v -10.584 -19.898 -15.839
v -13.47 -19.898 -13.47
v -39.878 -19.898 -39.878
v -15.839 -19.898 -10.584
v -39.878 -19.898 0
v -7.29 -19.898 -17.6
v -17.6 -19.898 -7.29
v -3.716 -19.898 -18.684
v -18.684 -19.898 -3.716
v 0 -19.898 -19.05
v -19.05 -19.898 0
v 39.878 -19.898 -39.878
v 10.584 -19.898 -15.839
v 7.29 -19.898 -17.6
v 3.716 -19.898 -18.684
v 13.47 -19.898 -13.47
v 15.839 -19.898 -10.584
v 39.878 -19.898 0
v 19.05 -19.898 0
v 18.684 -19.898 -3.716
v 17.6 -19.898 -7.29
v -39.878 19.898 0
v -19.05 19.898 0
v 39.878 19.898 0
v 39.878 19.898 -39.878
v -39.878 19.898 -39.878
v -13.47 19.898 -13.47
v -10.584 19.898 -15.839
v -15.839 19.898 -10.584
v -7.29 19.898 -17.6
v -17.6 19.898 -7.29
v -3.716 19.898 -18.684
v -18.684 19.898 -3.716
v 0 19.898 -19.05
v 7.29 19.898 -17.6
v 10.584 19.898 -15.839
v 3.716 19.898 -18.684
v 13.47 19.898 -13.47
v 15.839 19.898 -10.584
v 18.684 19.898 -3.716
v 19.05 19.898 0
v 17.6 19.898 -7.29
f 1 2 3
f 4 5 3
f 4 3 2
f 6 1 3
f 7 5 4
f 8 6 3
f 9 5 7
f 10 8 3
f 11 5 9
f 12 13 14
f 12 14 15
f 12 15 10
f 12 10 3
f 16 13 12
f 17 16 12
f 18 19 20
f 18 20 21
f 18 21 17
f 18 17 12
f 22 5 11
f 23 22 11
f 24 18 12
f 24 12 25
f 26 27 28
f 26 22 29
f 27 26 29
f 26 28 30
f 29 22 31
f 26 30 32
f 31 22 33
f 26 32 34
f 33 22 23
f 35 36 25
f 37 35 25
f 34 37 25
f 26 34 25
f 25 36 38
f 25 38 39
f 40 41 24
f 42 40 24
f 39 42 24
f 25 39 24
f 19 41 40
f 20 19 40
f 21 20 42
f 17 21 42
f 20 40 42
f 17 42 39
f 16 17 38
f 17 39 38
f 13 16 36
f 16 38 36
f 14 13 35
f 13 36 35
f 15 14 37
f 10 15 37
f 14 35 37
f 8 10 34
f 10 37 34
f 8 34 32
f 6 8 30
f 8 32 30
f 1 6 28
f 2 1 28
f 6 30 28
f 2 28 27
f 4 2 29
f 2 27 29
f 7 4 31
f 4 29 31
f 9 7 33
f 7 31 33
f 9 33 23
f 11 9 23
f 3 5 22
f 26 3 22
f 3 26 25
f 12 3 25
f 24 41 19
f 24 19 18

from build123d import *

# Parameters (mm, degrees)
SKETCH2_W               = 79.756
SKETCH2_H               = 39.795093556
BOSS_EXTRUDE1_DEPTH     = 39.878
SKETCH4_R               = 19.05
CUT_EXTRUDE2_DEPTH      = 1
CUT_EXTRUDE2_DEPTH_BACK = 40.795093555


with BuildPart() as part:
    # Sketch2 → Boss-Extrude1 (new body)
    with BuildSketch(Plane.XY):
        Rectangle(SKETCH2_W, SKETCH2_H)
    extrude(amount=-BOSS_EXTRUDE1_DEPTH)

    # Sketch4 → Cut-Extrude2 (cut, two sides)
    with BuildSketch(Plane(origin=(0, 19.897546778, 0), x_dir=(1, 0, 0), z_dir=(0, 1, 0))) as cut_extrude2_sk:
        Circle(SKETCH4_R)
    extrude(amount=CUT_EXTRUDE2_DEPTH, mode=Mode.SUBTRACT)
    extrude(cut_extrude2_sk.sketch, amount=-CUT_EXTRUDE2_DEPTH_BACK, mode=Mode.SUBTRACT)


solid = part.part
